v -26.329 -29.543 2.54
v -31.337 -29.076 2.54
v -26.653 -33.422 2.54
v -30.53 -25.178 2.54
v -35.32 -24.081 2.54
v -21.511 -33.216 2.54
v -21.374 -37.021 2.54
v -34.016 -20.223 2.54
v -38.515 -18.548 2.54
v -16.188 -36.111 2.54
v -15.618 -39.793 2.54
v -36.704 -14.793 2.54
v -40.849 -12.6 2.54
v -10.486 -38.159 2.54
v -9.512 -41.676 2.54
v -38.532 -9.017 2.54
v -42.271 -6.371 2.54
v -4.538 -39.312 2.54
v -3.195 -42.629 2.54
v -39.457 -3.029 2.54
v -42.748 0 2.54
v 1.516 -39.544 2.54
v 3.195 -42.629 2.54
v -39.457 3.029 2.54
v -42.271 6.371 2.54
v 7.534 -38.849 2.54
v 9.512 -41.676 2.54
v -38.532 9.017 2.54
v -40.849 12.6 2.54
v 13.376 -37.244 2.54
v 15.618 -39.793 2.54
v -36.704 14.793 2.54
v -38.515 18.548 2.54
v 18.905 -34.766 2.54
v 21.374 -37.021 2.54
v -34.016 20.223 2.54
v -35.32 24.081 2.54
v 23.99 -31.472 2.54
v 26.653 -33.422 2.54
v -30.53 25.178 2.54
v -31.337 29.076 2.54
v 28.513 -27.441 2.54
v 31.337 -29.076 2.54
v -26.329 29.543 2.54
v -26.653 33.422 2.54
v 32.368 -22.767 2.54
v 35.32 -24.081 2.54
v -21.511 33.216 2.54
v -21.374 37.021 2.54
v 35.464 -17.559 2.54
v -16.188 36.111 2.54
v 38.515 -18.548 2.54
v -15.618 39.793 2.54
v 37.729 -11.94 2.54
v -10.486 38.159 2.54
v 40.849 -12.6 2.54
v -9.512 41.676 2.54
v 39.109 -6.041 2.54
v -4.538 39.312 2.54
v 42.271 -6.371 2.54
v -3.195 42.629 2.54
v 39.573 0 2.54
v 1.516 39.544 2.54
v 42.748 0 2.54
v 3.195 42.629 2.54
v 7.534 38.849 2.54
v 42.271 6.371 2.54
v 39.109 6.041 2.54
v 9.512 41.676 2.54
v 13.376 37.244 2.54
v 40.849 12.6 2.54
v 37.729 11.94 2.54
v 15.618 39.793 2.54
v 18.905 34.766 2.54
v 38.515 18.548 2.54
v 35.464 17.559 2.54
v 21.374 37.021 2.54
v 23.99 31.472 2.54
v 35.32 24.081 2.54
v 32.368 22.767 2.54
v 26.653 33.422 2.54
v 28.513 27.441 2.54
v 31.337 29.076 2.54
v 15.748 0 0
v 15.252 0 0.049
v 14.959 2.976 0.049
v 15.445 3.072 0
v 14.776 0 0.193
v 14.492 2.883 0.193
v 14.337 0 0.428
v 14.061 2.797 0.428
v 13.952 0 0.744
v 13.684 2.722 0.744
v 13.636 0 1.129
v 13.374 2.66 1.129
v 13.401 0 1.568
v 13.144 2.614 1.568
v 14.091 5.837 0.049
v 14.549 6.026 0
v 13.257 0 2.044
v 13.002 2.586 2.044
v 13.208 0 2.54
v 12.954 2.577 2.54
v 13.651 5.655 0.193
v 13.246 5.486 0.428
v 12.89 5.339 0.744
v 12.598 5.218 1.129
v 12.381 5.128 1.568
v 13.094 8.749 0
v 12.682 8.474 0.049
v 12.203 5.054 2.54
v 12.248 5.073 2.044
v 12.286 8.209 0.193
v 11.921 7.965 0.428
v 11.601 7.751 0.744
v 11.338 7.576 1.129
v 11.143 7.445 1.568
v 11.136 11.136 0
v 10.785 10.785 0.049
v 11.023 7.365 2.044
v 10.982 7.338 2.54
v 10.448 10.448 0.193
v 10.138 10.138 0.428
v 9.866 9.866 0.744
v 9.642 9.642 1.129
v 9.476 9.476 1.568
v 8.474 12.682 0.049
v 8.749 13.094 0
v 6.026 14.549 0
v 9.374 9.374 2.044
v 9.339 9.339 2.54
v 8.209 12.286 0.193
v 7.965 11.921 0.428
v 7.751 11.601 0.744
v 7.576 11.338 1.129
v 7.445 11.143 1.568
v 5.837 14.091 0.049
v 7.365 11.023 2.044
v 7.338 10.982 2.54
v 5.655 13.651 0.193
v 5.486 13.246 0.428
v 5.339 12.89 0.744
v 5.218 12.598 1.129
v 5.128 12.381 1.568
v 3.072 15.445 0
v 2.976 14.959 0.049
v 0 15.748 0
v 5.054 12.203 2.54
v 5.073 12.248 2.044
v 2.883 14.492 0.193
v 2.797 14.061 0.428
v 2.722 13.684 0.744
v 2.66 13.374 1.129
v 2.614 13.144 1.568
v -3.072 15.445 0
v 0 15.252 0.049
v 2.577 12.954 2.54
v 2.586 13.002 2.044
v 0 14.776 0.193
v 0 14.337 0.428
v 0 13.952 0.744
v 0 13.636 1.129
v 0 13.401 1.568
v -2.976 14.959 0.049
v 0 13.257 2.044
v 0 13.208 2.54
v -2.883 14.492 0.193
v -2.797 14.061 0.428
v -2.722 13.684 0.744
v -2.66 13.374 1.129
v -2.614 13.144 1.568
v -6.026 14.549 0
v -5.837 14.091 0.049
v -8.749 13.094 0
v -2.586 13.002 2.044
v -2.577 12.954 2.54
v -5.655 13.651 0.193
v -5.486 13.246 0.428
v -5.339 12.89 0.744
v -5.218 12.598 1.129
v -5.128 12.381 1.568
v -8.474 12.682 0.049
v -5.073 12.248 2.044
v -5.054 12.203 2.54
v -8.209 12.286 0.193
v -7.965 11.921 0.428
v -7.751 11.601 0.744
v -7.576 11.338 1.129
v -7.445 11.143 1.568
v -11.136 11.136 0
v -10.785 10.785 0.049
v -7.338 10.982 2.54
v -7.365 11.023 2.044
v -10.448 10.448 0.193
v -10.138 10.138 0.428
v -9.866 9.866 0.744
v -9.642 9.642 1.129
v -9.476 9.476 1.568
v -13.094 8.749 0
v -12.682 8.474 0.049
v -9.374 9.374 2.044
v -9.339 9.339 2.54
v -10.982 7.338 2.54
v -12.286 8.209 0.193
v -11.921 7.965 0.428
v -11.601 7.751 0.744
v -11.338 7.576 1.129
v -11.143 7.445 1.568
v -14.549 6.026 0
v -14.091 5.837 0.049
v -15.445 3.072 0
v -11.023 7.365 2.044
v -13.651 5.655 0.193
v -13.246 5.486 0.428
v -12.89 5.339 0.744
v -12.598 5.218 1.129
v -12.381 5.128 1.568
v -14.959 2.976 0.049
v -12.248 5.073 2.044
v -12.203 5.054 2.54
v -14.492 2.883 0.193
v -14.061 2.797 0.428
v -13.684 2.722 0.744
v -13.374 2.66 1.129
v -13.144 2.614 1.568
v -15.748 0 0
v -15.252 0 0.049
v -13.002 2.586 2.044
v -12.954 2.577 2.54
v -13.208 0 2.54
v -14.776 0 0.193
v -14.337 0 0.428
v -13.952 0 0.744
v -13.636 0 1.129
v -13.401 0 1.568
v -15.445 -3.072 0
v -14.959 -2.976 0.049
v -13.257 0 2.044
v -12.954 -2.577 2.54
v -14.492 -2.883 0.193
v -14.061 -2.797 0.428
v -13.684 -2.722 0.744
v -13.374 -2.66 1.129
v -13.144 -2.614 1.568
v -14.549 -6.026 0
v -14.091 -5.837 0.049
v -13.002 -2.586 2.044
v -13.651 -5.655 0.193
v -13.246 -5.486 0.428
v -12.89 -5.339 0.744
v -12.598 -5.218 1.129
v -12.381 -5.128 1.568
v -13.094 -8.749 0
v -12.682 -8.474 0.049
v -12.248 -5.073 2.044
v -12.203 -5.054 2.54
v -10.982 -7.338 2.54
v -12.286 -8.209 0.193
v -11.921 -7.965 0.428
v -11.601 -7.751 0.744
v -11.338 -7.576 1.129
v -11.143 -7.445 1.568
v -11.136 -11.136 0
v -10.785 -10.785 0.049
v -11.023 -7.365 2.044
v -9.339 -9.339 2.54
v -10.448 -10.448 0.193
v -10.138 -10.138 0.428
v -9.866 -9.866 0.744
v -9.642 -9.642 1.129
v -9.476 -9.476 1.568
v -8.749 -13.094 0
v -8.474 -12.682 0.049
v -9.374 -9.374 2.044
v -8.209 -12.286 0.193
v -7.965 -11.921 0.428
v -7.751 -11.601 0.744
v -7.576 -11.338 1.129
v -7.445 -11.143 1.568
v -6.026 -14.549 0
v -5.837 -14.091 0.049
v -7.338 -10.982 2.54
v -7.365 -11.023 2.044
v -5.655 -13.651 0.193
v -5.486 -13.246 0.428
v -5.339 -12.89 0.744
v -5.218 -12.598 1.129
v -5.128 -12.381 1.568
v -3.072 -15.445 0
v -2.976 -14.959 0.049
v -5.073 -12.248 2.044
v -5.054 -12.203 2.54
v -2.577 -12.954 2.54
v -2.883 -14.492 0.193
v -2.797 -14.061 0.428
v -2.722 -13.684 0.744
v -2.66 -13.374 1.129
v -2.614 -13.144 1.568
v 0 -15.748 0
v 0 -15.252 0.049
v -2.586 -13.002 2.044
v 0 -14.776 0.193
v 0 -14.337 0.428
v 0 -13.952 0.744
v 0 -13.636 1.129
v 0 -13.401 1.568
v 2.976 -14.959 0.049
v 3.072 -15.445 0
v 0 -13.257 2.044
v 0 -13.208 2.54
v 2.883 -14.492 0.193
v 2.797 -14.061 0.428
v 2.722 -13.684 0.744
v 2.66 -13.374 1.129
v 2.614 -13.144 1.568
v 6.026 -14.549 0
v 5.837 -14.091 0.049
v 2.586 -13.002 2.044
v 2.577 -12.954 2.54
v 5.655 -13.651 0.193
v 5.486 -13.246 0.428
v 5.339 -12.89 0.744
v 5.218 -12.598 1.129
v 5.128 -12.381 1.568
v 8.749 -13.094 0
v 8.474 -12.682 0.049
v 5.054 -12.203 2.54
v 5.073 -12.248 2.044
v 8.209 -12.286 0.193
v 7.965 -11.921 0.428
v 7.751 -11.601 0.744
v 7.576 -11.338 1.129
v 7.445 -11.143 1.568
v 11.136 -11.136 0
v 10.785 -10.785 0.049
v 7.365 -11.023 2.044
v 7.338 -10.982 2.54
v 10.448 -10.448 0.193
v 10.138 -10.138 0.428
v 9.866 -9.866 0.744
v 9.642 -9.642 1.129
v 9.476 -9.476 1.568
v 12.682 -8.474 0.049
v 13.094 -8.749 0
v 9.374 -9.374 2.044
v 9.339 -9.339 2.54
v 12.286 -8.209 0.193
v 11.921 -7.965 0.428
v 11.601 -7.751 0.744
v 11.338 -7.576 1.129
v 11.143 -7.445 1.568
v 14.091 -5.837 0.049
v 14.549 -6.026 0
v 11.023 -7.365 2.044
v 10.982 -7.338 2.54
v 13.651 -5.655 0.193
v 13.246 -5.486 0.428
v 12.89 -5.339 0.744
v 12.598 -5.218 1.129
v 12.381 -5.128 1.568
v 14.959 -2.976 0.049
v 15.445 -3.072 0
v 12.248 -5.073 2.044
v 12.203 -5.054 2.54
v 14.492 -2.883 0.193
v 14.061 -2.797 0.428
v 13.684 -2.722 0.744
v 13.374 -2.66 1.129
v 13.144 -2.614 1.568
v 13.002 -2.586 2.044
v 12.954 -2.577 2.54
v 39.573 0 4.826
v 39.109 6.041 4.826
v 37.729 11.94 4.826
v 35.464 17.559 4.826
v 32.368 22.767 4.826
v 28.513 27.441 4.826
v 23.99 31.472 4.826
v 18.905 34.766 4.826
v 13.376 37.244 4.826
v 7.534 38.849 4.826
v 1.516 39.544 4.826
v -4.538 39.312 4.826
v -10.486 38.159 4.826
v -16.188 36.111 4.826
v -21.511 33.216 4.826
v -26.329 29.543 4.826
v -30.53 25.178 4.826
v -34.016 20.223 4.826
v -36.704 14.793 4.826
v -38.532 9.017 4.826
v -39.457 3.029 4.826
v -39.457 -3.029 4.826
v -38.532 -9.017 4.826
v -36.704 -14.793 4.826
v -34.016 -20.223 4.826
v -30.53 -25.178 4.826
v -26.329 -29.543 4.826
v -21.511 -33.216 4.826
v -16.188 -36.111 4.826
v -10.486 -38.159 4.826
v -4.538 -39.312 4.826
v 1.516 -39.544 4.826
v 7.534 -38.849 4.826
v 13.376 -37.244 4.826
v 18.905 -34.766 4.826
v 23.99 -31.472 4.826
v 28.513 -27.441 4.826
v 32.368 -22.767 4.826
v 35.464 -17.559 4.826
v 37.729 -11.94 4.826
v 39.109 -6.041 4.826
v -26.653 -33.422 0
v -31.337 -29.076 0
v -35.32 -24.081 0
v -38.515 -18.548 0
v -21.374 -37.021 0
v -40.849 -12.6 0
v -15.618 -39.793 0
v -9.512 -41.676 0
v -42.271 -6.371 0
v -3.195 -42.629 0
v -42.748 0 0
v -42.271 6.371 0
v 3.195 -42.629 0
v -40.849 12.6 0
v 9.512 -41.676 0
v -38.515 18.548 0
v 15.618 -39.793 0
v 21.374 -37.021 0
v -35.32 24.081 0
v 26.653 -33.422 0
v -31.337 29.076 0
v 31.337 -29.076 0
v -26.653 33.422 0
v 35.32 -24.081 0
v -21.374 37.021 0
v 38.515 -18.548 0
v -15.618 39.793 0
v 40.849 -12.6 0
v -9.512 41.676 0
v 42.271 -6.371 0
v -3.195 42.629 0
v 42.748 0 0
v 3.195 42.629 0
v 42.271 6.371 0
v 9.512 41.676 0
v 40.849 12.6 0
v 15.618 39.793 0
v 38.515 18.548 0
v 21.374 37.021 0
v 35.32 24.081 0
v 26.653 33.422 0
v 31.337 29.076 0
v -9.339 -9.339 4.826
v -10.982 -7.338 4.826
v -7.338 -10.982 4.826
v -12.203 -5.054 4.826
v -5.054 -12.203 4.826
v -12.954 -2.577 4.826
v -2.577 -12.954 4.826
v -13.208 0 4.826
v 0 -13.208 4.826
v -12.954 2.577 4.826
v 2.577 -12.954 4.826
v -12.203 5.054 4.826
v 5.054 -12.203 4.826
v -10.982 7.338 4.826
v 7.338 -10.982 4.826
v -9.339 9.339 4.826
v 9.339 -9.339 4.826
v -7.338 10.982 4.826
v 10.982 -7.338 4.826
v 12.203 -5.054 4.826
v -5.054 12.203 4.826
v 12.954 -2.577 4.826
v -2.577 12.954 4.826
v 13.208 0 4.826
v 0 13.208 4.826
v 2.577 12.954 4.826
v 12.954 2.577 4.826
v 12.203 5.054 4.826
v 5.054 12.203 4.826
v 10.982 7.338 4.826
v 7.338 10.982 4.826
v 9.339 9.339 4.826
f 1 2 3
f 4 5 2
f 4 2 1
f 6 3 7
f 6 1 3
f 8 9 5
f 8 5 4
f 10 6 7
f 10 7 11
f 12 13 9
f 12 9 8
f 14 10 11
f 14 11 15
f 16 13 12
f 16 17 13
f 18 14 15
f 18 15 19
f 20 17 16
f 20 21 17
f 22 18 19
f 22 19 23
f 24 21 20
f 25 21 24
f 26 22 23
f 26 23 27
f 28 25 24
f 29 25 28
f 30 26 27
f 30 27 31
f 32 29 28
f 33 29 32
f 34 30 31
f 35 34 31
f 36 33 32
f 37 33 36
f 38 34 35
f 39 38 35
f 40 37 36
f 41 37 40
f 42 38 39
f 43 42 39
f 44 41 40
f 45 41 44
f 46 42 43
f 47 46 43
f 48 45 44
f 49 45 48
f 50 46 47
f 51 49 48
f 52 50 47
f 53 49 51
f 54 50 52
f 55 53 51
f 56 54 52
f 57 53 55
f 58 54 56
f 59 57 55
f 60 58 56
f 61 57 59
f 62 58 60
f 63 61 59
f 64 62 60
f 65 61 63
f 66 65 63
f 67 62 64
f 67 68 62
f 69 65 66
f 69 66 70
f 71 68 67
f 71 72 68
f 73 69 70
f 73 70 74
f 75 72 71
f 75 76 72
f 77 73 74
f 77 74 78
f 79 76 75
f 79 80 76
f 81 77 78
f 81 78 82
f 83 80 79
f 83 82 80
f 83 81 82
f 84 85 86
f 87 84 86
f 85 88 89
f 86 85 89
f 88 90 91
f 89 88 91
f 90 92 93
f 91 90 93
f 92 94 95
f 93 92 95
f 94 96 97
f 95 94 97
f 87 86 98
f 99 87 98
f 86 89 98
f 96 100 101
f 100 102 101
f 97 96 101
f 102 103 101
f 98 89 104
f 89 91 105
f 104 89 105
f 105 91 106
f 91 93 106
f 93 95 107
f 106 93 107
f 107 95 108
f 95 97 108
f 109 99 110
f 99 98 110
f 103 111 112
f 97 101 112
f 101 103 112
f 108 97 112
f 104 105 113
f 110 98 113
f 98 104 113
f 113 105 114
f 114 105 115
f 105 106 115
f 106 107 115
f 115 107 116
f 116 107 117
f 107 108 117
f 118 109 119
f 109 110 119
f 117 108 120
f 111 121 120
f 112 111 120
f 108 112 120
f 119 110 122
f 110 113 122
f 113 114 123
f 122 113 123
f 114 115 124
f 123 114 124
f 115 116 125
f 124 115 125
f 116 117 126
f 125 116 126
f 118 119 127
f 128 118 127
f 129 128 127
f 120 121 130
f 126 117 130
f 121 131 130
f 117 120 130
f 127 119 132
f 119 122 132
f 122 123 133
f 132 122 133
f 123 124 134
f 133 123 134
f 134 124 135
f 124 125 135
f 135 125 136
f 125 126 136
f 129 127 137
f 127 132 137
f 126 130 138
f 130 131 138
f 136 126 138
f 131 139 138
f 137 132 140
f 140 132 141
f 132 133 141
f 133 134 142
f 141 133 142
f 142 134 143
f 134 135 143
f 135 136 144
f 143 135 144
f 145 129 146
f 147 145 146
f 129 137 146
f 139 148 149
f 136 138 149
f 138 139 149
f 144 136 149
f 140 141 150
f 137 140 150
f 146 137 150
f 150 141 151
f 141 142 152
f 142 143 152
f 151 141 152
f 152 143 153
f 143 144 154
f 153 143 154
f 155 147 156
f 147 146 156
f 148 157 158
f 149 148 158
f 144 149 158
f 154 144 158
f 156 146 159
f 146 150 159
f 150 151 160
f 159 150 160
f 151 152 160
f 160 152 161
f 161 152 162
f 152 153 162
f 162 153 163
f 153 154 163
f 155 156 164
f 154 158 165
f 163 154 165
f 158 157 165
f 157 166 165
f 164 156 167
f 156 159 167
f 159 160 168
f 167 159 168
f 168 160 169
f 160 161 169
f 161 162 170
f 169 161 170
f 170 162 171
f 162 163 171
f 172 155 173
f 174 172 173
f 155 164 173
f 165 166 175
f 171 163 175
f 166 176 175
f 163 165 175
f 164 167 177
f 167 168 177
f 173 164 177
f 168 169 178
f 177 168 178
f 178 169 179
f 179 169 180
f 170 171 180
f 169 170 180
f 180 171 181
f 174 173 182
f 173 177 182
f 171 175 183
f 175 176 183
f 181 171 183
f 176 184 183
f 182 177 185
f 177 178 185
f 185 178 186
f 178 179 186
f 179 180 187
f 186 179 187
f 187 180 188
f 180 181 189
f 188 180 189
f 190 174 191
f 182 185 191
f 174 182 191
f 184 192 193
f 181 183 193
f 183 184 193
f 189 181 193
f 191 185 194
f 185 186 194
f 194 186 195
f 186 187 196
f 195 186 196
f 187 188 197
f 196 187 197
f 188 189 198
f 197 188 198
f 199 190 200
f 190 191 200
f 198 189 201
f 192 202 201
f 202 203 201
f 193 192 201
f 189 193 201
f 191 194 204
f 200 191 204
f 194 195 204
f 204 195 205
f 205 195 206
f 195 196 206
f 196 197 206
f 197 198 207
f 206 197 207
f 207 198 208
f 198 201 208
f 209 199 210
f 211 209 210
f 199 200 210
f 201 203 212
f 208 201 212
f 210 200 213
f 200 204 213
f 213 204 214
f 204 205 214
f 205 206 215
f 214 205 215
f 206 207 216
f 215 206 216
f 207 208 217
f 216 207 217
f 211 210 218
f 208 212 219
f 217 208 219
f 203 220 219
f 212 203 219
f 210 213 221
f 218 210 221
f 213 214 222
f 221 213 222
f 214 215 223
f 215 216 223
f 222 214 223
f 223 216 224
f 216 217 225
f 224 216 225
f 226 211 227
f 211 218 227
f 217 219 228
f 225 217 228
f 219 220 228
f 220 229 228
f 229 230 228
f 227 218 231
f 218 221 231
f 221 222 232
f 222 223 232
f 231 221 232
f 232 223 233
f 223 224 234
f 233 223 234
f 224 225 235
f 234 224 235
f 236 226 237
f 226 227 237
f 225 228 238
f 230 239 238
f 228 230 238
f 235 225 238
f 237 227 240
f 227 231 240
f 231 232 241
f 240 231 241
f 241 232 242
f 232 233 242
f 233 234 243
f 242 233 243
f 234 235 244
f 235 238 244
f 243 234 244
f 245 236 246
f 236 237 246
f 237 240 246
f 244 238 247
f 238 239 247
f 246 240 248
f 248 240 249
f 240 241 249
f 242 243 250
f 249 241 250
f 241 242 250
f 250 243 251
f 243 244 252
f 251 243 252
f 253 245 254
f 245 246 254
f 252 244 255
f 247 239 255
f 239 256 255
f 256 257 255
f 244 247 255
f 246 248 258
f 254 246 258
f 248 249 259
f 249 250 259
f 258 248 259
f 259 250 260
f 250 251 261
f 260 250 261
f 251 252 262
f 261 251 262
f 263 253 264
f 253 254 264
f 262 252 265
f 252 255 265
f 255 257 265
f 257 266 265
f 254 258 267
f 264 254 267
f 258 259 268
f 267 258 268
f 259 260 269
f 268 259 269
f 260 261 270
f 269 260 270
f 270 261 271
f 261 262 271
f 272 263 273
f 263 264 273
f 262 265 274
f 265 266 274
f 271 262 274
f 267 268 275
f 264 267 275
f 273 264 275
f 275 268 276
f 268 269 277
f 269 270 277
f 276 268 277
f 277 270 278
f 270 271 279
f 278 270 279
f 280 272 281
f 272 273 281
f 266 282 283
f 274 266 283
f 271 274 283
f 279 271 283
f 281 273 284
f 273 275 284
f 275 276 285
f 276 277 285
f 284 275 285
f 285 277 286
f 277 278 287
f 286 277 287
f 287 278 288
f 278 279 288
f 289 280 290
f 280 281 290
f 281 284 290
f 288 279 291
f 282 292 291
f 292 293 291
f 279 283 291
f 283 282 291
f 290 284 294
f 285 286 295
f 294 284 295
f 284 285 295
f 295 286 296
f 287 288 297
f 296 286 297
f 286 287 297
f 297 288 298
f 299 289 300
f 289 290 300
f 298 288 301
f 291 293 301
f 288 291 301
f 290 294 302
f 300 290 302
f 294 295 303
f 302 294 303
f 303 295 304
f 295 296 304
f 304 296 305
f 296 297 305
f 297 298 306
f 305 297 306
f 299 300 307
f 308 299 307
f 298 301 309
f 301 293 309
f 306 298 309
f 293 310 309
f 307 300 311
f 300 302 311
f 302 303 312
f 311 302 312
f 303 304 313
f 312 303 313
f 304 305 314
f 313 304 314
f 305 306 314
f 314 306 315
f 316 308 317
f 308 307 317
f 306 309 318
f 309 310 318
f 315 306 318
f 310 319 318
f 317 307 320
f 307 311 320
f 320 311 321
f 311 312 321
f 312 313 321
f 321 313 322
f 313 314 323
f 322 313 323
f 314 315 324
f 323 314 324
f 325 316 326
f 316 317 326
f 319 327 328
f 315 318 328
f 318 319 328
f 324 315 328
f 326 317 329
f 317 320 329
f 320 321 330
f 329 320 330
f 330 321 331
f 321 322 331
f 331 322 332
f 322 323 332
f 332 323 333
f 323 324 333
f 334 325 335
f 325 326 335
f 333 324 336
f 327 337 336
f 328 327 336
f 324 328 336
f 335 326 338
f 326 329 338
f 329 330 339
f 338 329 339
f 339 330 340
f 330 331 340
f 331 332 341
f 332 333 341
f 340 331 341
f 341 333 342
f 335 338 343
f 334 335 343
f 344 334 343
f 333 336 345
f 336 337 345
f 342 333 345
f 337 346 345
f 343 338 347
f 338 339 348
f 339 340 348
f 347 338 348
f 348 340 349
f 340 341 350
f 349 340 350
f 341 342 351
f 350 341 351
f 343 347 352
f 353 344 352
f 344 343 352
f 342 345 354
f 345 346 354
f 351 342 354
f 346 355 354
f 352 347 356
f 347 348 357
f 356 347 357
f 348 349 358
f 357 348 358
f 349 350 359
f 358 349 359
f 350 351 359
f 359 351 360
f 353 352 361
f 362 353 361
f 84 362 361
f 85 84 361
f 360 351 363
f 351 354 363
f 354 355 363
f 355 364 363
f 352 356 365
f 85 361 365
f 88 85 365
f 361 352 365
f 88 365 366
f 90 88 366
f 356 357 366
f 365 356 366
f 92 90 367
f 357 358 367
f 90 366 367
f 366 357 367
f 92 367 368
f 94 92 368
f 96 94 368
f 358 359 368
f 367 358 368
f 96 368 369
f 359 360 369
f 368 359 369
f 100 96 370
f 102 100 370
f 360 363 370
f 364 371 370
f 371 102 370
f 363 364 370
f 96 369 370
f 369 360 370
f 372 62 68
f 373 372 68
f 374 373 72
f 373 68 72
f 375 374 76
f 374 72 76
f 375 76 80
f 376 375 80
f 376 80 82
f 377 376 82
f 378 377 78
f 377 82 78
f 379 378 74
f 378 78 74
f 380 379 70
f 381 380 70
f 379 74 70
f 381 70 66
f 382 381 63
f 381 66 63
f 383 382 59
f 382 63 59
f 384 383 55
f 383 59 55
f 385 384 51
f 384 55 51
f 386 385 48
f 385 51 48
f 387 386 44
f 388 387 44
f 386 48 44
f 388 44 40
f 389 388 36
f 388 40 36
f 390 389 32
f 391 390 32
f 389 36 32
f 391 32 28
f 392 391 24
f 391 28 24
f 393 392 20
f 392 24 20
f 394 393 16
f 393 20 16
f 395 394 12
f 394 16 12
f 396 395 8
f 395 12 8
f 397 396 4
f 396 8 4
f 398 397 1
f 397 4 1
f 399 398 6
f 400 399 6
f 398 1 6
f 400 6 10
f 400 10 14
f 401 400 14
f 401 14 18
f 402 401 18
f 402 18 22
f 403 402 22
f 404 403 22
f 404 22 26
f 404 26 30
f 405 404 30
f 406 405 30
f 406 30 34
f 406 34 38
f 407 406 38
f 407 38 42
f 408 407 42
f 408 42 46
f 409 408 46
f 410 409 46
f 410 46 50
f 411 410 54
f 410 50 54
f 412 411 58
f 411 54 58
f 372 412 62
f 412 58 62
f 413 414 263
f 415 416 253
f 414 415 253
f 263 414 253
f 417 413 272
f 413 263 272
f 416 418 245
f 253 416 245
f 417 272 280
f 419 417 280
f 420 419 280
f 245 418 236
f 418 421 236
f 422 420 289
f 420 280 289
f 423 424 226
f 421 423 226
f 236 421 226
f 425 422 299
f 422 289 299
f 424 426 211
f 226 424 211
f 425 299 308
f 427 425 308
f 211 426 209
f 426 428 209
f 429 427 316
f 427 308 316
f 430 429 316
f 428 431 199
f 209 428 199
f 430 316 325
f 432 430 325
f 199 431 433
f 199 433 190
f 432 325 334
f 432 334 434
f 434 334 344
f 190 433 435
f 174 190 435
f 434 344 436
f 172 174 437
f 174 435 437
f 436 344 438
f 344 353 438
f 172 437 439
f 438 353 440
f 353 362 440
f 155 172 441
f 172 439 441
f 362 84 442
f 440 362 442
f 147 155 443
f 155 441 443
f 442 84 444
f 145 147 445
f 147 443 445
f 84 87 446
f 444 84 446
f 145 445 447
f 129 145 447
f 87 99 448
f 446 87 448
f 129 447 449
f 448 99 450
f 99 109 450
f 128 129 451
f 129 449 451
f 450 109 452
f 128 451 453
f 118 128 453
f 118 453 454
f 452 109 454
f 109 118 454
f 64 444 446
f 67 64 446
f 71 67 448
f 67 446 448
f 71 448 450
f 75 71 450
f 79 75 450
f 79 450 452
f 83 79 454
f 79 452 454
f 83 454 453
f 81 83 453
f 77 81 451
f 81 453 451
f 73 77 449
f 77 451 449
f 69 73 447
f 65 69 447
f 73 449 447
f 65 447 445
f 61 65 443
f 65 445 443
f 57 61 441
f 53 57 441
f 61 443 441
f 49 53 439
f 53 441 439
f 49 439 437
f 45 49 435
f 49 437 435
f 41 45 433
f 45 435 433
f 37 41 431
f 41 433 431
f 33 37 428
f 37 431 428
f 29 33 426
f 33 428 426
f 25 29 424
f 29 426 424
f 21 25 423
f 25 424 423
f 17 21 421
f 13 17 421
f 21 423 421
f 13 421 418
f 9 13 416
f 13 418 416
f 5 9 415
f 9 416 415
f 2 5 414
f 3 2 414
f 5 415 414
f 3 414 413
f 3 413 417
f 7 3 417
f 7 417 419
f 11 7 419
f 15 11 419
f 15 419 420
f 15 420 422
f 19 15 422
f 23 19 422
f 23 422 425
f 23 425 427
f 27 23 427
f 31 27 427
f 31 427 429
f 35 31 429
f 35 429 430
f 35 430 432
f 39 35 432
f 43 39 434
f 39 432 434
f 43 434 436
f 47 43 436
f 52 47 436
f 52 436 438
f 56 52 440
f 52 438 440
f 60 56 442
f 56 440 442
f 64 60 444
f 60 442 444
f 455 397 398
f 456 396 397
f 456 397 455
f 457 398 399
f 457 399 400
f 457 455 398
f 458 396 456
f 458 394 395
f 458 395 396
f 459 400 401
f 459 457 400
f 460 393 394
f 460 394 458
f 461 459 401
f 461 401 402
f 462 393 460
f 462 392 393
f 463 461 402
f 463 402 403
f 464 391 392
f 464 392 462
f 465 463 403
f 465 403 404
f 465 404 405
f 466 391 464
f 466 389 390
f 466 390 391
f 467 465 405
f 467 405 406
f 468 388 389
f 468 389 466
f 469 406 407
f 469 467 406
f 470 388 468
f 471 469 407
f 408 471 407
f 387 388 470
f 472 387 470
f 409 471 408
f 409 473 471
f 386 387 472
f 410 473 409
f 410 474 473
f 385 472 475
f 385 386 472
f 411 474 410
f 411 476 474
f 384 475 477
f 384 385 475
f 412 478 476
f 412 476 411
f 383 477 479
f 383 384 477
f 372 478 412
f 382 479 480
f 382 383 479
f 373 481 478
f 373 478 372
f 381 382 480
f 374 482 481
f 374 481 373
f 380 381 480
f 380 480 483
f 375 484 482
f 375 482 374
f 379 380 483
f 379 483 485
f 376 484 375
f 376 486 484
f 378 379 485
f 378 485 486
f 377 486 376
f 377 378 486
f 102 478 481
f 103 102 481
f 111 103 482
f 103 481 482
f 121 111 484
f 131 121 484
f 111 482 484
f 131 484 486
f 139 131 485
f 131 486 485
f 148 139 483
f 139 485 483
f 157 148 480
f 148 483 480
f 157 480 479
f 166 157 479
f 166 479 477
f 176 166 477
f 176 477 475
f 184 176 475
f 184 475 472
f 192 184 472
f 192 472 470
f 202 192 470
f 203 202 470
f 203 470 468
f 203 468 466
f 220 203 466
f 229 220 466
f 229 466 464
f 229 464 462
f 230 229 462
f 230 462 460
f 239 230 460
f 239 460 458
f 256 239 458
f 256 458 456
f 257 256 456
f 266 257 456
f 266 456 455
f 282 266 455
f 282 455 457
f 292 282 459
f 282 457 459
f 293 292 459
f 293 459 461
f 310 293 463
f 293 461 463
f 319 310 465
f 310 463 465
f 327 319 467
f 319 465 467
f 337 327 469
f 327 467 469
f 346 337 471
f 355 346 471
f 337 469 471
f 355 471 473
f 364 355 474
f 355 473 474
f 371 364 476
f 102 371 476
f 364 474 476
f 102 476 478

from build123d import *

# Parameters (mm, degrees)
F0_R     = 42.7482
F1_DEPTH = 2.54
F2_R     = 39.5732
F3_DEPTH = 2.286
F4_R     = 13.208
F5_DEPTH = 4.827
F6_R     = 2.54


with BuildPart() as f1:
    # F0 (on Top) → F1 (new body)
    with BuildSketch(Plane.XY):
        Circle(F0_R)
    extrude(amount=F1_DEPTH)

    # F2 (on face) → F3 (join)
    with BuildSketch(Plane.XY.offset(2.54)):
        Circle(F2_R)
    extrude(amount=F3_DEPTH)

    # F4 (on face) → F5 (cut, through all)
    with BuildSketch(Plane.XY.offset(4.826)):
        Circle(F4_R)
    extrude(amount=-F5_DEPTH, mode=Mode.SUBTRACT)

    # F6
    f6_edges = [f1.edges().sort_by_distance(p)[0] for p in [
        (-13.208, 0, 0),
    ]]
    fillet(f6_edges, radius=F6_R)


solid = f1.part
